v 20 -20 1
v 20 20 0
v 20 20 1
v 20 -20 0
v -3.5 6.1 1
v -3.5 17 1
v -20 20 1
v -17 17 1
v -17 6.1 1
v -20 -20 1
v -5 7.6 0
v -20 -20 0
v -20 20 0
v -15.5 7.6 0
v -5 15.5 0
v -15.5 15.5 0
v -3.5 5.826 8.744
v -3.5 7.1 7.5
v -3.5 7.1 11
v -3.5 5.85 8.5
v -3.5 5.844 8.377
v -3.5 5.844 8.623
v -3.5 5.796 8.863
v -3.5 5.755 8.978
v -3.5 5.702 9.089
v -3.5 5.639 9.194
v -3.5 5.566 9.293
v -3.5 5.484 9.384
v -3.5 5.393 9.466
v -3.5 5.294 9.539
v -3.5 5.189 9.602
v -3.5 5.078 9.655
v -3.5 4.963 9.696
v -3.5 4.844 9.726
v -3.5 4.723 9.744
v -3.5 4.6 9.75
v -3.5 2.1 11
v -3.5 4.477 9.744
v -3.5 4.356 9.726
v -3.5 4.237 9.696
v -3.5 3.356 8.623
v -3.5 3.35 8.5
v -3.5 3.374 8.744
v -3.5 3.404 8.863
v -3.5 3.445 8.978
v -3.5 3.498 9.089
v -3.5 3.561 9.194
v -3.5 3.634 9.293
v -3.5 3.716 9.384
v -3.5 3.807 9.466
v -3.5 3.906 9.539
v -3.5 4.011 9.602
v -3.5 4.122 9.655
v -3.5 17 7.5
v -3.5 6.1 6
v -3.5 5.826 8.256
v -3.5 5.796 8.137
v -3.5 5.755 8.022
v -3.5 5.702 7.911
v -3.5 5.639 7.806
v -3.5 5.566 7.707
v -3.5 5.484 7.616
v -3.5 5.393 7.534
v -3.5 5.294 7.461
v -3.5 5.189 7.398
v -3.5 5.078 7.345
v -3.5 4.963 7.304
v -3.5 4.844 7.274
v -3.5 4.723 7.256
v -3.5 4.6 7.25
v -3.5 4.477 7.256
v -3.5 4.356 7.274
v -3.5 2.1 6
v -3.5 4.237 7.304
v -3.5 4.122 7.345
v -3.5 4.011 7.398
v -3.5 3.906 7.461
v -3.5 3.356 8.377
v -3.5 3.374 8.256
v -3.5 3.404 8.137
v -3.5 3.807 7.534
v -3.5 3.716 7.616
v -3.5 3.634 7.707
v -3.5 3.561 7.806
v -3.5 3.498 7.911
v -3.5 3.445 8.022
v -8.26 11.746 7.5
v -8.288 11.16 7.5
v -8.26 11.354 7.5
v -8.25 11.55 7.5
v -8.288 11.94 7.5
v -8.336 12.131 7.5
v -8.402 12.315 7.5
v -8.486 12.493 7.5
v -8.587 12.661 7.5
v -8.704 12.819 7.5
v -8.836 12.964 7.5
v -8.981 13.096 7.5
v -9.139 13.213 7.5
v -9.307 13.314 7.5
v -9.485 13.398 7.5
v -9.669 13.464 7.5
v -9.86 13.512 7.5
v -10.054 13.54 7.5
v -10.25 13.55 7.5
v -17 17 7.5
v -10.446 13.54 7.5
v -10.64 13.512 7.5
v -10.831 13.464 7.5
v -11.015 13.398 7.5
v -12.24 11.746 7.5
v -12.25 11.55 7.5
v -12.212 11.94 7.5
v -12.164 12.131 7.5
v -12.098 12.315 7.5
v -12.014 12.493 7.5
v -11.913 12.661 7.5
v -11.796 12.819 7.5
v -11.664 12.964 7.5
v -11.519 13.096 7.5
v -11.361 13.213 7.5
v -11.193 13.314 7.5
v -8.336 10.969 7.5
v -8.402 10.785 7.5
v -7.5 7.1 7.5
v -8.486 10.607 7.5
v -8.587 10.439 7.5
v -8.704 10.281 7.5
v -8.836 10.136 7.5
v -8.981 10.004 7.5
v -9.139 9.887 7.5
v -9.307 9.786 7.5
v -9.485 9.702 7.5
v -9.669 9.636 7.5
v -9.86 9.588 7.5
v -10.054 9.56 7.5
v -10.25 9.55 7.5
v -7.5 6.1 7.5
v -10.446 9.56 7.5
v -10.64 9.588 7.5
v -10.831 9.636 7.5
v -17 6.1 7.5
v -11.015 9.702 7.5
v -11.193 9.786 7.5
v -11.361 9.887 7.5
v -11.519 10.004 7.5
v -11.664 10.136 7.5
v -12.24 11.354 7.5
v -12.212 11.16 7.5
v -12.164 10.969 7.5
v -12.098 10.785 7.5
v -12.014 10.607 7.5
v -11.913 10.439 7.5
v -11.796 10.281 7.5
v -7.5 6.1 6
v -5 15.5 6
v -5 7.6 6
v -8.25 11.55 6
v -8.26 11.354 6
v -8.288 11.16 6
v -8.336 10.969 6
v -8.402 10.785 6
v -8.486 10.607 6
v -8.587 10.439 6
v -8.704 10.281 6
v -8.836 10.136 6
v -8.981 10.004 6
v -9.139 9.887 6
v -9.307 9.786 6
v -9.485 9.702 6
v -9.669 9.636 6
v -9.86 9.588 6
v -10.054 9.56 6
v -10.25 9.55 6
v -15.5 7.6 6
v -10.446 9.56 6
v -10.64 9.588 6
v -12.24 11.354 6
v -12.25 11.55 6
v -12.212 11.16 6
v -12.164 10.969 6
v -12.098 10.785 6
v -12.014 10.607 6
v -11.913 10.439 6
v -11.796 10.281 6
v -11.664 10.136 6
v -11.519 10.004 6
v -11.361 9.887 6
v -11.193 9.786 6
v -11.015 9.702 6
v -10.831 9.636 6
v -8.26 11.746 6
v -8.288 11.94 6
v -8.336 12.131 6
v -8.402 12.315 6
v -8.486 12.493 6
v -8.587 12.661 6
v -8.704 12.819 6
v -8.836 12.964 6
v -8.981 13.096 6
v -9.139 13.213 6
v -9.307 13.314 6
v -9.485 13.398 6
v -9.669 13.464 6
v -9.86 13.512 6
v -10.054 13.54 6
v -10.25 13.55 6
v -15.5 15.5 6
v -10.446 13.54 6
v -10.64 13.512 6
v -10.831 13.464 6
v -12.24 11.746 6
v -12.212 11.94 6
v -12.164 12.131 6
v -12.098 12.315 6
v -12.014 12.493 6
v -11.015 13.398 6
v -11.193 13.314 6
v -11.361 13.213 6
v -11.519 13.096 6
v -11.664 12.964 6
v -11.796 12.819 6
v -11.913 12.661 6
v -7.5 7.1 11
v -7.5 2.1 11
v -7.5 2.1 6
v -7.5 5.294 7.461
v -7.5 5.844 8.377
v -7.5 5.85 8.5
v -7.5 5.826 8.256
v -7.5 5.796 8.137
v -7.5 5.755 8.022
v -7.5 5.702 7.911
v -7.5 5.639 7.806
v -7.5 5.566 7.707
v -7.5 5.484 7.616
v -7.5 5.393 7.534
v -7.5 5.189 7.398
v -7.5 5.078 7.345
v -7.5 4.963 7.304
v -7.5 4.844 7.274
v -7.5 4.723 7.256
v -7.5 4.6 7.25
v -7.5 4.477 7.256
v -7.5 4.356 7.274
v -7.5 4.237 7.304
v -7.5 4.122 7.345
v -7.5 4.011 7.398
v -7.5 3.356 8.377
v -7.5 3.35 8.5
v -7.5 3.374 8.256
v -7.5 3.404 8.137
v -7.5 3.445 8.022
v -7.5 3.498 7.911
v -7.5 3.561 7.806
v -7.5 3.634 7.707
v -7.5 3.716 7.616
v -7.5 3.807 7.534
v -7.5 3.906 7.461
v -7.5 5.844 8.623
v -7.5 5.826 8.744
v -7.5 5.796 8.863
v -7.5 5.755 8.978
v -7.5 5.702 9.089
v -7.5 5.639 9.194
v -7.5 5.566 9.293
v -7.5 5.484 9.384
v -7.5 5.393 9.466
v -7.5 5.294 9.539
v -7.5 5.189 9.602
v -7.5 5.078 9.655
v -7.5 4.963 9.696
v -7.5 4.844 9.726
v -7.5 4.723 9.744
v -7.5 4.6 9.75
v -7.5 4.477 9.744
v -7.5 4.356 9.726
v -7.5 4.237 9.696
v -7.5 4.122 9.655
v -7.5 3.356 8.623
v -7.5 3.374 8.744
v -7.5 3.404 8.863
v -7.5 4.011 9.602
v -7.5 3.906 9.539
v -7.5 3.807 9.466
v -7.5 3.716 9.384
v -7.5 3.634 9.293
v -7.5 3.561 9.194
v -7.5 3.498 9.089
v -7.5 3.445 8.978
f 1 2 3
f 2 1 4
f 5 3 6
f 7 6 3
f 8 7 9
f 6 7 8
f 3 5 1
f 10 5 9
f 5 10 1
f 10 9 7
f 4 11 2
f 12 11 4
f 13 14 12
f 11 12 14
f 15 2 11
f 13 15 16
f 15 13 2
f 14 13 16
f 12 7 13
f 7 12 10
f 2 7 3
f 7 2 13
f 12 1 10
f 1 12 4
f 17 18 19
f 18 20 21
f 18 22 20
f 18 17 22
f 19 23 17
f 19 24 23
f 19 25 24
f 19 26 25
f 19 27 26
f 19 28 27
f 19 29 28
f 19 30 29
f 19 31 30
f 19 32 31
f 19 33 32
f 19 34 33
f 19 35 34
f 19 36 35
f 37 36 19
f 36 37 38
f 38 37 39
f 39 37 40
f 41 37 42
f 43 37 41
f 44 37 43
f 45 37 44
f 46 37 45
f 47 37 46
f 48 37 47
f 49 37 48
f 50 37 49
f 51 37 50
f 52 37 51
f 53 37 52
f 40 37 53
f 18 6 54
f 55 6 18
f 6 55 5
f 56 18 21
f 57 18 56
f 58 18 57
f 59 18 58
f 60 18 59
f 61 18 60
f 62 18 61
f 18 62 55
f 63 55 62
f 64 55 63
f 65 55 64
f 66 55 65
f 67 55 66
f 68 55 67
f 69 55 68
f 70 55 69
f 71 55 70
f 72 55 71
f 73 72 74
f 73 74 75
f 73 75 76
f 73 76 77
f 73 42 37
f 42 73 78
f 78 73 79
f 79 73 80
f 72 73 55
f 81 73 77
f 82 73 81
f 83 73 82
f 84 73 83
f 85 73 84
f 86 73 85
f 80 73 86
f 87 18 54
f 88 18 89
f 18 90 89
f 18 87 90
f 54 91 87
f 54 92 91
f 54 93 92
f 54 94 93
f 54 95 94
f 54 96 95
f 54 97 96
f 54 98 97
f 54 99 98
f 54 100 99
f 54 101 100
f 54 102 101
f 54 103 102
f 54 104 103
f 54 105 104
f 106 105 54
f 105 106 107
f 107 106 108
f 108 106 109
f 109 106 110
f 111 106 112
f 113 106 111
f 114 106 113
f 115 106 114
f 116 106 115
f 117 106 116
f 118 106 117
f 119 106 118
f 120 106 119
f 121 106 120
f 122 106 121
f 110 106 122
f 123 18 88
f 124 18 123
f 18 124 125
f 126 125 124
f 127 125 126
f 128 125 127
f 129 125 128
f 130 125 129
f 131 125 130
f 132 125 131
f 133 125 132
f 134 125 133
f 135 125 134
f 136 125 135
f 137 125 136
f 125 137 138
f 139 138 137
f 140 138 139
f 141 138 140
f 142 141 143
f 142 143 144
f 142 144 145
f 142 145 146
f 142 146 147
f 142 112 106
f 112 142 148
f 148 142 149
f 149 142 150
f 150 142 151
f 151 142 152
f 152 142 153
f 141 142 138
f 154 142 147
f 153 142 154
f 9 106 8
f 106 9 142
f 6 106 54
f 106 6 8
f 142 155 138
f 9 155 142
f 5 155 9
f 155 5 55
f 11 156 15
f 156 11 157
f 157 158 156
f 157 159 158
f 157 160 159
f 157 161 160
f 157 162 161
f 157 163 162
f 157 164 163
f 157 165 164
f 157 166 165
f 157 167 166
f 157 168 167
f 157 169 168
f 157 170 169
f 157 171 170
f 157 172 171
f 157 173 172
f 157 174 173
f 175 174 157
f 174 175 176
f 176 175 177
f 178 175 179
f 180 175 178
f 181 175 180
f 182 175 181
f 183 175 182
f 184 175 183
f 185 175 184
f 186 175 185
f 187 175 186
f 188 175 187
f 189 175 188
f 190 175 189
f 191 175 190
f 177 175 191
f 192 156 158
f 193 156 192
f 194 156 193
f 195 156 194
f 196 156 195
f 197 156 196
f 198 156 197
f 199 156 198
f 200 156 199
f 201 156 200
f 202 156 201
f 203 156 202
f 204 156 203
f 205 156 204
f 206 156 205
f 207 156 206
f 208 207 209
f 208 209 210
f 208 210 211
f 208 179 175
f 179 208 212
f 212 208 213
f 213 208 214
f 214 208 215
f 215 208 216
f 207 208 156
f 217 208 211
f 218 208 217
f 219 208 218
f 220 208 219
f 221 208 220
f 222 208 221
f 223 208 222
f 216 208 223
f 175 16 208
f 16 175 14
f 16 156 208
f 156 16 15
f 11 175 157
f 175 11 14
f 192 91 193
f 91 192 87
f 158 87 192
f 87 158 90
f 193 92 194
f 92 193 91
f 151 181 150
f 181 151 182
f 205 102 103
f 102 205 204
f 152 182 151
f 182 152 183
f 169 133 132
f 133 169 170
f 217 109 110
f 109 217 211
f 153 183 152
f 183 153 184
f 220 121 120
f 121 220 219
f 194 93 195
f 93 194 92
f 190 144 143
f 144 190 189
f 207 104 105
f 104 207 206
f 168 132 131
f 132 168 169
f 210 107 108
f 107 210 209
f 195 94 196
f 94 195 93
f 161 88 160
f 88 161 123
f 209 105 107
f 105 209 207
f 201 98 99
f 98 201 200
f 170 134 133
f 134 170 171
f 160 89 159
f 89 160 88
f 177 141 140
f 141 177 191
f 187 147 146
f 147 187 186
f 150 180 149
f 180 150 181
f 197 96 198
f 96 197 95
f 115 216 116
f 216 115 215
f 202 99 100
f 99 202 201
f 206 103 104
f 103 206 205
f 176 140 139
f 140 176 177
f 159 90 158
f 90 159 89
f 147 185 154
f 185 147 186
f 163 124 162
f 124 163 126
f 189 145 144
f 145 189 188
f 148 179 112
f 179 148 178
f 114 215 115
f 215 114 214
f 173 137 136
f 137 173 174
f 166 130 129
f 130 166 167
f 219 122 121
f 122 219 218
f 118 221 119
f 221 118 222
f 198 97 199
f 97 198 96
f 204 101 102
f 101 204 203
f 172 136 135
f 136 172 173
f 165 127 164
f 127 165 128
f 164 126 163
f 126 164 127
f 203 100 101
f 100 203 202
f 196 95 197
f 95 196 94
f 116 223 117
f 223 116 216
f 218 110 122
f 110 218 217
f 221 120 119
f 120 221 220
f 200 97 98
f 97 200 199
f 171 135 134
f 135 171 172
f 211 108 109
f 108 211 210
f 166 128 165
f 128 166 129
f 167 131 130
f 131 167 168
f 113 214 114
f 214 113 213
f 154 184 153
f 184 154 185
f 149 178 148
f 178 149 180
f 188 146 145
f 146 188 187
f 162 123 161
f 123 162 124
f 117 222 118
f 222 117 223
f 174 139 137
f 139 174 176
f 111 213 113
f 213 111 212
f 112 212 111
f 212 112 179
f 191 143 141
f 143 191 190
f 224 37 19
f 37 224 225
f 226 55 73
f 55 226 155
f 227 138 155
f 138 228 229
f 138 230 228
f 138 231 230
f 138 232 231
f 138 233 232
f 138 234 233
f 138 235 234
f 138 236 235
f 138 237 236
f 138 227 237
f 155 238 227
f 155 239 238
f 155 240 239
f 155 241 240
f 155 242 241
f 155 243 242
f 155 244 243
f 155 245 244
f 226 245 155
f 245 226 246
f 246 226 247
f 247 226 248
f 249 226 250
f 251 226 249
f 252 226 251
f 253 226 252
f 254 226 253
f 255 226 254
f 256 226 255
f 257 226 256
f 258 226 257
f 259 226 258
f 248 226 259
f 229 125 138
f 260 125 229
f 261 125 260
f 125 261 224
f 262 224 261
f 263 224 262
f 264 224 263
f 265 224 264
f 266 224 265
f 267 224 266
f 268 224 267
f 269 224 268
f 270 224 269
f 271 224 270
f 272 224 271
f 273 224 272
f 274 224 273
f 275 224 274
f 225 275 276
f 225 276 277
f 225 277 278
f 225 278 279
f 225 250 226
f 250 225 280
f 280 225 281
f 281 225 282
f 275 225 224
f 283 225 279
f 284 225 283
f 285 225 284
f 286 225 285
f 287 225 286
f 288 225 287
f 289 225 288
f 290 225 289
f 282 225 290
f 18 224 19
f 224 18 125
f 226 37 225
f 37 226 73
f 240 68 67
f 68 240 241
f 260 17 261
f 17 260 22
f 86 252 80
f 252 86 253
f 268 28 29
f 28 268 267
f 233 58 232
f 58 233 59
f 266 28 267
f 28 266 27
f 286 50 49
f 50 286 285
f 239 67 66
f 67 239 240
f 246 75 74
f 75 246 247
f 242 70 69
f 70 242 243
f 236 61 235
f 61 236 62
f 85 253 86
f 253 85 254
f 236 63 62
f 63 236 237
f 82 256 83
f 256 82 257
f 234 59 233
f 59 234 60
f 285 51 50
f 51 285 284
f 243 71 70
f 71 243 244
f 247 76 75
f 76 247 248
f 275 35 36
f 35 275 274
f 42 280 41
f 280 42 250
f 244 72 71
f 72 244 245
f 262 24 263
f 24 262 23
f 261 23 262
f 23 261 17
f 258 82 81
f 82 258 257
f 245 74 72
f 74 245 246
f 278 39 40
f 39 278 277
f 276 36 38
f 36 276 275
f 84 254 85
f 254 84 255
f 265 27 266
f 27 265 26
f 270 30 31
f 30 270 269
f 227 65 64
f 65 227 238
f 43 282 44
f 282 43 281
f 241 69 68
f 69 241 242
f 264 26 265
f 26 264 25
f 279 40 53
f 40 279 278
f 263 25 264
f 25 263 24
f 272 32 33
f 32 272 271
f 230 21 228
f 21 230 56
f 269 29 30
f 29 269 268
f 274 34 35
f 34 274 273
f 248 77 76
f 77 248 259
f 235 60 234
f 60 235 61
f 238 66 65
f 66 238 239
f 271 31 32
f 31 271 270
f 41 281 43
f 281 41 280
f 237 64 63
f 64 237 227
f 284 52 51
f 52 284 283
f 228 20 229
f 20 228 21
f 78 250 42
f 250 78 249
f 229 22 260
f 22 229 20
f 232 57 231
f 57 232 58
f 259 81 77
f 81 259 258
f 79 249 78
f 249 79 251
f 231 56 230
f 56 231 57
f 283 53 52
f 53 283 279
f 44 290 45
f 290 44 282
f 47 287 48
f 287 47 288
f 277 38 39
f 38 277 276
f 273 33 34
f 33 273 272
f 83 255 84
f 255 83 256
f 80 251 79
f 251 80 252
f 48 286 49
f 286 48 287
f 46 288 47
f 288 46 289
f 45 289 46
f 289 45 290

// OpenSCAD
// PRAYCG ALS-PT19 40x40mm Flanged Shroud (Upper-Left Inset)
// All units in mm

// --- PARAMETERS ---
flange_size = 40.0;     // 40mm x 40mm outer light-blocking base
flange_thickness = 1.0; // Thickness of the tape flange
edge_inset = 3.0;       // Inset distance from top and left flange edges

sensor_width = 10.5;    // 10.1mm + 0.4mm printer shrinkage tolerance
sensor_height = 7.9;    // 7.5mm + 0.4mm printer shrinkage tolerance
cavity_depth = 6.0;     // Depth to swallow the sensor body
wall_thickness = 1.5;   // Solid walls to prevent light leakage
wire_hole_dia = 4.0;    // Wire passthrough hole

$fn = 64; // High resolution for smooth curves

// Derived outer housing dimensions
housing_w = sensor_width + 2 * wall_thickness;
housing_h = sensor_height + 2 * wall_thickness;

// Position housing in the upper-left quadrant
pos_x = -flange_size/2 + edge_inset;
pos_y =  flange_size/2 - edge_inset - housing_h;

// --- GEOMETRY ---
union() {
    difference() {
        // 1. Outer Geometry (Flange Base + Housing Block)
        union() {
            // Flat 40x40mm screen contact flange
            translate([-flange_size/2, -flange_size/2, 0])
                cube([flange_size, flange_size, flange_thickness]);
            
            // Inset sensor housing block
            translate([pos_x, pos_y, 0])
                cube([housing_w, housing_h, cavity_depth + wall_thickness]);
        }
        
        // 2. Sensor Cavity Cutout (Front opening)
        translate([pos_x + wall_thickness, pos_y + wall_thickness, -0.1])
            cube([sensor_width, sensor_height, cavity_depth + 0.1]);
            
        // 3. Centered Wire Exit Hole (Through back wall)
        translate([pos_x + housing_w/2, pos_y + housing_h/2, cavity_depth - 0.1])
            cylinder(h = wall_thickness + 0.5, d = wire_hole_dia);
    }
    
    // 4. Strain Relief Zip-Tie Anchor (Facing inward toward the flange body)
    translate([pos_x + housing_w - 4, pos_y - 4, cavity_depth]) {
        difference() {
            // Anchor block
            cube([4, 5, 5]); 
            // Zip-tie channel
            translate([-1, 2.5, 2.5])
                rotate([0, 90, 0])
                cylinder(h = 6, d = 2.5);
        }
    }
}
